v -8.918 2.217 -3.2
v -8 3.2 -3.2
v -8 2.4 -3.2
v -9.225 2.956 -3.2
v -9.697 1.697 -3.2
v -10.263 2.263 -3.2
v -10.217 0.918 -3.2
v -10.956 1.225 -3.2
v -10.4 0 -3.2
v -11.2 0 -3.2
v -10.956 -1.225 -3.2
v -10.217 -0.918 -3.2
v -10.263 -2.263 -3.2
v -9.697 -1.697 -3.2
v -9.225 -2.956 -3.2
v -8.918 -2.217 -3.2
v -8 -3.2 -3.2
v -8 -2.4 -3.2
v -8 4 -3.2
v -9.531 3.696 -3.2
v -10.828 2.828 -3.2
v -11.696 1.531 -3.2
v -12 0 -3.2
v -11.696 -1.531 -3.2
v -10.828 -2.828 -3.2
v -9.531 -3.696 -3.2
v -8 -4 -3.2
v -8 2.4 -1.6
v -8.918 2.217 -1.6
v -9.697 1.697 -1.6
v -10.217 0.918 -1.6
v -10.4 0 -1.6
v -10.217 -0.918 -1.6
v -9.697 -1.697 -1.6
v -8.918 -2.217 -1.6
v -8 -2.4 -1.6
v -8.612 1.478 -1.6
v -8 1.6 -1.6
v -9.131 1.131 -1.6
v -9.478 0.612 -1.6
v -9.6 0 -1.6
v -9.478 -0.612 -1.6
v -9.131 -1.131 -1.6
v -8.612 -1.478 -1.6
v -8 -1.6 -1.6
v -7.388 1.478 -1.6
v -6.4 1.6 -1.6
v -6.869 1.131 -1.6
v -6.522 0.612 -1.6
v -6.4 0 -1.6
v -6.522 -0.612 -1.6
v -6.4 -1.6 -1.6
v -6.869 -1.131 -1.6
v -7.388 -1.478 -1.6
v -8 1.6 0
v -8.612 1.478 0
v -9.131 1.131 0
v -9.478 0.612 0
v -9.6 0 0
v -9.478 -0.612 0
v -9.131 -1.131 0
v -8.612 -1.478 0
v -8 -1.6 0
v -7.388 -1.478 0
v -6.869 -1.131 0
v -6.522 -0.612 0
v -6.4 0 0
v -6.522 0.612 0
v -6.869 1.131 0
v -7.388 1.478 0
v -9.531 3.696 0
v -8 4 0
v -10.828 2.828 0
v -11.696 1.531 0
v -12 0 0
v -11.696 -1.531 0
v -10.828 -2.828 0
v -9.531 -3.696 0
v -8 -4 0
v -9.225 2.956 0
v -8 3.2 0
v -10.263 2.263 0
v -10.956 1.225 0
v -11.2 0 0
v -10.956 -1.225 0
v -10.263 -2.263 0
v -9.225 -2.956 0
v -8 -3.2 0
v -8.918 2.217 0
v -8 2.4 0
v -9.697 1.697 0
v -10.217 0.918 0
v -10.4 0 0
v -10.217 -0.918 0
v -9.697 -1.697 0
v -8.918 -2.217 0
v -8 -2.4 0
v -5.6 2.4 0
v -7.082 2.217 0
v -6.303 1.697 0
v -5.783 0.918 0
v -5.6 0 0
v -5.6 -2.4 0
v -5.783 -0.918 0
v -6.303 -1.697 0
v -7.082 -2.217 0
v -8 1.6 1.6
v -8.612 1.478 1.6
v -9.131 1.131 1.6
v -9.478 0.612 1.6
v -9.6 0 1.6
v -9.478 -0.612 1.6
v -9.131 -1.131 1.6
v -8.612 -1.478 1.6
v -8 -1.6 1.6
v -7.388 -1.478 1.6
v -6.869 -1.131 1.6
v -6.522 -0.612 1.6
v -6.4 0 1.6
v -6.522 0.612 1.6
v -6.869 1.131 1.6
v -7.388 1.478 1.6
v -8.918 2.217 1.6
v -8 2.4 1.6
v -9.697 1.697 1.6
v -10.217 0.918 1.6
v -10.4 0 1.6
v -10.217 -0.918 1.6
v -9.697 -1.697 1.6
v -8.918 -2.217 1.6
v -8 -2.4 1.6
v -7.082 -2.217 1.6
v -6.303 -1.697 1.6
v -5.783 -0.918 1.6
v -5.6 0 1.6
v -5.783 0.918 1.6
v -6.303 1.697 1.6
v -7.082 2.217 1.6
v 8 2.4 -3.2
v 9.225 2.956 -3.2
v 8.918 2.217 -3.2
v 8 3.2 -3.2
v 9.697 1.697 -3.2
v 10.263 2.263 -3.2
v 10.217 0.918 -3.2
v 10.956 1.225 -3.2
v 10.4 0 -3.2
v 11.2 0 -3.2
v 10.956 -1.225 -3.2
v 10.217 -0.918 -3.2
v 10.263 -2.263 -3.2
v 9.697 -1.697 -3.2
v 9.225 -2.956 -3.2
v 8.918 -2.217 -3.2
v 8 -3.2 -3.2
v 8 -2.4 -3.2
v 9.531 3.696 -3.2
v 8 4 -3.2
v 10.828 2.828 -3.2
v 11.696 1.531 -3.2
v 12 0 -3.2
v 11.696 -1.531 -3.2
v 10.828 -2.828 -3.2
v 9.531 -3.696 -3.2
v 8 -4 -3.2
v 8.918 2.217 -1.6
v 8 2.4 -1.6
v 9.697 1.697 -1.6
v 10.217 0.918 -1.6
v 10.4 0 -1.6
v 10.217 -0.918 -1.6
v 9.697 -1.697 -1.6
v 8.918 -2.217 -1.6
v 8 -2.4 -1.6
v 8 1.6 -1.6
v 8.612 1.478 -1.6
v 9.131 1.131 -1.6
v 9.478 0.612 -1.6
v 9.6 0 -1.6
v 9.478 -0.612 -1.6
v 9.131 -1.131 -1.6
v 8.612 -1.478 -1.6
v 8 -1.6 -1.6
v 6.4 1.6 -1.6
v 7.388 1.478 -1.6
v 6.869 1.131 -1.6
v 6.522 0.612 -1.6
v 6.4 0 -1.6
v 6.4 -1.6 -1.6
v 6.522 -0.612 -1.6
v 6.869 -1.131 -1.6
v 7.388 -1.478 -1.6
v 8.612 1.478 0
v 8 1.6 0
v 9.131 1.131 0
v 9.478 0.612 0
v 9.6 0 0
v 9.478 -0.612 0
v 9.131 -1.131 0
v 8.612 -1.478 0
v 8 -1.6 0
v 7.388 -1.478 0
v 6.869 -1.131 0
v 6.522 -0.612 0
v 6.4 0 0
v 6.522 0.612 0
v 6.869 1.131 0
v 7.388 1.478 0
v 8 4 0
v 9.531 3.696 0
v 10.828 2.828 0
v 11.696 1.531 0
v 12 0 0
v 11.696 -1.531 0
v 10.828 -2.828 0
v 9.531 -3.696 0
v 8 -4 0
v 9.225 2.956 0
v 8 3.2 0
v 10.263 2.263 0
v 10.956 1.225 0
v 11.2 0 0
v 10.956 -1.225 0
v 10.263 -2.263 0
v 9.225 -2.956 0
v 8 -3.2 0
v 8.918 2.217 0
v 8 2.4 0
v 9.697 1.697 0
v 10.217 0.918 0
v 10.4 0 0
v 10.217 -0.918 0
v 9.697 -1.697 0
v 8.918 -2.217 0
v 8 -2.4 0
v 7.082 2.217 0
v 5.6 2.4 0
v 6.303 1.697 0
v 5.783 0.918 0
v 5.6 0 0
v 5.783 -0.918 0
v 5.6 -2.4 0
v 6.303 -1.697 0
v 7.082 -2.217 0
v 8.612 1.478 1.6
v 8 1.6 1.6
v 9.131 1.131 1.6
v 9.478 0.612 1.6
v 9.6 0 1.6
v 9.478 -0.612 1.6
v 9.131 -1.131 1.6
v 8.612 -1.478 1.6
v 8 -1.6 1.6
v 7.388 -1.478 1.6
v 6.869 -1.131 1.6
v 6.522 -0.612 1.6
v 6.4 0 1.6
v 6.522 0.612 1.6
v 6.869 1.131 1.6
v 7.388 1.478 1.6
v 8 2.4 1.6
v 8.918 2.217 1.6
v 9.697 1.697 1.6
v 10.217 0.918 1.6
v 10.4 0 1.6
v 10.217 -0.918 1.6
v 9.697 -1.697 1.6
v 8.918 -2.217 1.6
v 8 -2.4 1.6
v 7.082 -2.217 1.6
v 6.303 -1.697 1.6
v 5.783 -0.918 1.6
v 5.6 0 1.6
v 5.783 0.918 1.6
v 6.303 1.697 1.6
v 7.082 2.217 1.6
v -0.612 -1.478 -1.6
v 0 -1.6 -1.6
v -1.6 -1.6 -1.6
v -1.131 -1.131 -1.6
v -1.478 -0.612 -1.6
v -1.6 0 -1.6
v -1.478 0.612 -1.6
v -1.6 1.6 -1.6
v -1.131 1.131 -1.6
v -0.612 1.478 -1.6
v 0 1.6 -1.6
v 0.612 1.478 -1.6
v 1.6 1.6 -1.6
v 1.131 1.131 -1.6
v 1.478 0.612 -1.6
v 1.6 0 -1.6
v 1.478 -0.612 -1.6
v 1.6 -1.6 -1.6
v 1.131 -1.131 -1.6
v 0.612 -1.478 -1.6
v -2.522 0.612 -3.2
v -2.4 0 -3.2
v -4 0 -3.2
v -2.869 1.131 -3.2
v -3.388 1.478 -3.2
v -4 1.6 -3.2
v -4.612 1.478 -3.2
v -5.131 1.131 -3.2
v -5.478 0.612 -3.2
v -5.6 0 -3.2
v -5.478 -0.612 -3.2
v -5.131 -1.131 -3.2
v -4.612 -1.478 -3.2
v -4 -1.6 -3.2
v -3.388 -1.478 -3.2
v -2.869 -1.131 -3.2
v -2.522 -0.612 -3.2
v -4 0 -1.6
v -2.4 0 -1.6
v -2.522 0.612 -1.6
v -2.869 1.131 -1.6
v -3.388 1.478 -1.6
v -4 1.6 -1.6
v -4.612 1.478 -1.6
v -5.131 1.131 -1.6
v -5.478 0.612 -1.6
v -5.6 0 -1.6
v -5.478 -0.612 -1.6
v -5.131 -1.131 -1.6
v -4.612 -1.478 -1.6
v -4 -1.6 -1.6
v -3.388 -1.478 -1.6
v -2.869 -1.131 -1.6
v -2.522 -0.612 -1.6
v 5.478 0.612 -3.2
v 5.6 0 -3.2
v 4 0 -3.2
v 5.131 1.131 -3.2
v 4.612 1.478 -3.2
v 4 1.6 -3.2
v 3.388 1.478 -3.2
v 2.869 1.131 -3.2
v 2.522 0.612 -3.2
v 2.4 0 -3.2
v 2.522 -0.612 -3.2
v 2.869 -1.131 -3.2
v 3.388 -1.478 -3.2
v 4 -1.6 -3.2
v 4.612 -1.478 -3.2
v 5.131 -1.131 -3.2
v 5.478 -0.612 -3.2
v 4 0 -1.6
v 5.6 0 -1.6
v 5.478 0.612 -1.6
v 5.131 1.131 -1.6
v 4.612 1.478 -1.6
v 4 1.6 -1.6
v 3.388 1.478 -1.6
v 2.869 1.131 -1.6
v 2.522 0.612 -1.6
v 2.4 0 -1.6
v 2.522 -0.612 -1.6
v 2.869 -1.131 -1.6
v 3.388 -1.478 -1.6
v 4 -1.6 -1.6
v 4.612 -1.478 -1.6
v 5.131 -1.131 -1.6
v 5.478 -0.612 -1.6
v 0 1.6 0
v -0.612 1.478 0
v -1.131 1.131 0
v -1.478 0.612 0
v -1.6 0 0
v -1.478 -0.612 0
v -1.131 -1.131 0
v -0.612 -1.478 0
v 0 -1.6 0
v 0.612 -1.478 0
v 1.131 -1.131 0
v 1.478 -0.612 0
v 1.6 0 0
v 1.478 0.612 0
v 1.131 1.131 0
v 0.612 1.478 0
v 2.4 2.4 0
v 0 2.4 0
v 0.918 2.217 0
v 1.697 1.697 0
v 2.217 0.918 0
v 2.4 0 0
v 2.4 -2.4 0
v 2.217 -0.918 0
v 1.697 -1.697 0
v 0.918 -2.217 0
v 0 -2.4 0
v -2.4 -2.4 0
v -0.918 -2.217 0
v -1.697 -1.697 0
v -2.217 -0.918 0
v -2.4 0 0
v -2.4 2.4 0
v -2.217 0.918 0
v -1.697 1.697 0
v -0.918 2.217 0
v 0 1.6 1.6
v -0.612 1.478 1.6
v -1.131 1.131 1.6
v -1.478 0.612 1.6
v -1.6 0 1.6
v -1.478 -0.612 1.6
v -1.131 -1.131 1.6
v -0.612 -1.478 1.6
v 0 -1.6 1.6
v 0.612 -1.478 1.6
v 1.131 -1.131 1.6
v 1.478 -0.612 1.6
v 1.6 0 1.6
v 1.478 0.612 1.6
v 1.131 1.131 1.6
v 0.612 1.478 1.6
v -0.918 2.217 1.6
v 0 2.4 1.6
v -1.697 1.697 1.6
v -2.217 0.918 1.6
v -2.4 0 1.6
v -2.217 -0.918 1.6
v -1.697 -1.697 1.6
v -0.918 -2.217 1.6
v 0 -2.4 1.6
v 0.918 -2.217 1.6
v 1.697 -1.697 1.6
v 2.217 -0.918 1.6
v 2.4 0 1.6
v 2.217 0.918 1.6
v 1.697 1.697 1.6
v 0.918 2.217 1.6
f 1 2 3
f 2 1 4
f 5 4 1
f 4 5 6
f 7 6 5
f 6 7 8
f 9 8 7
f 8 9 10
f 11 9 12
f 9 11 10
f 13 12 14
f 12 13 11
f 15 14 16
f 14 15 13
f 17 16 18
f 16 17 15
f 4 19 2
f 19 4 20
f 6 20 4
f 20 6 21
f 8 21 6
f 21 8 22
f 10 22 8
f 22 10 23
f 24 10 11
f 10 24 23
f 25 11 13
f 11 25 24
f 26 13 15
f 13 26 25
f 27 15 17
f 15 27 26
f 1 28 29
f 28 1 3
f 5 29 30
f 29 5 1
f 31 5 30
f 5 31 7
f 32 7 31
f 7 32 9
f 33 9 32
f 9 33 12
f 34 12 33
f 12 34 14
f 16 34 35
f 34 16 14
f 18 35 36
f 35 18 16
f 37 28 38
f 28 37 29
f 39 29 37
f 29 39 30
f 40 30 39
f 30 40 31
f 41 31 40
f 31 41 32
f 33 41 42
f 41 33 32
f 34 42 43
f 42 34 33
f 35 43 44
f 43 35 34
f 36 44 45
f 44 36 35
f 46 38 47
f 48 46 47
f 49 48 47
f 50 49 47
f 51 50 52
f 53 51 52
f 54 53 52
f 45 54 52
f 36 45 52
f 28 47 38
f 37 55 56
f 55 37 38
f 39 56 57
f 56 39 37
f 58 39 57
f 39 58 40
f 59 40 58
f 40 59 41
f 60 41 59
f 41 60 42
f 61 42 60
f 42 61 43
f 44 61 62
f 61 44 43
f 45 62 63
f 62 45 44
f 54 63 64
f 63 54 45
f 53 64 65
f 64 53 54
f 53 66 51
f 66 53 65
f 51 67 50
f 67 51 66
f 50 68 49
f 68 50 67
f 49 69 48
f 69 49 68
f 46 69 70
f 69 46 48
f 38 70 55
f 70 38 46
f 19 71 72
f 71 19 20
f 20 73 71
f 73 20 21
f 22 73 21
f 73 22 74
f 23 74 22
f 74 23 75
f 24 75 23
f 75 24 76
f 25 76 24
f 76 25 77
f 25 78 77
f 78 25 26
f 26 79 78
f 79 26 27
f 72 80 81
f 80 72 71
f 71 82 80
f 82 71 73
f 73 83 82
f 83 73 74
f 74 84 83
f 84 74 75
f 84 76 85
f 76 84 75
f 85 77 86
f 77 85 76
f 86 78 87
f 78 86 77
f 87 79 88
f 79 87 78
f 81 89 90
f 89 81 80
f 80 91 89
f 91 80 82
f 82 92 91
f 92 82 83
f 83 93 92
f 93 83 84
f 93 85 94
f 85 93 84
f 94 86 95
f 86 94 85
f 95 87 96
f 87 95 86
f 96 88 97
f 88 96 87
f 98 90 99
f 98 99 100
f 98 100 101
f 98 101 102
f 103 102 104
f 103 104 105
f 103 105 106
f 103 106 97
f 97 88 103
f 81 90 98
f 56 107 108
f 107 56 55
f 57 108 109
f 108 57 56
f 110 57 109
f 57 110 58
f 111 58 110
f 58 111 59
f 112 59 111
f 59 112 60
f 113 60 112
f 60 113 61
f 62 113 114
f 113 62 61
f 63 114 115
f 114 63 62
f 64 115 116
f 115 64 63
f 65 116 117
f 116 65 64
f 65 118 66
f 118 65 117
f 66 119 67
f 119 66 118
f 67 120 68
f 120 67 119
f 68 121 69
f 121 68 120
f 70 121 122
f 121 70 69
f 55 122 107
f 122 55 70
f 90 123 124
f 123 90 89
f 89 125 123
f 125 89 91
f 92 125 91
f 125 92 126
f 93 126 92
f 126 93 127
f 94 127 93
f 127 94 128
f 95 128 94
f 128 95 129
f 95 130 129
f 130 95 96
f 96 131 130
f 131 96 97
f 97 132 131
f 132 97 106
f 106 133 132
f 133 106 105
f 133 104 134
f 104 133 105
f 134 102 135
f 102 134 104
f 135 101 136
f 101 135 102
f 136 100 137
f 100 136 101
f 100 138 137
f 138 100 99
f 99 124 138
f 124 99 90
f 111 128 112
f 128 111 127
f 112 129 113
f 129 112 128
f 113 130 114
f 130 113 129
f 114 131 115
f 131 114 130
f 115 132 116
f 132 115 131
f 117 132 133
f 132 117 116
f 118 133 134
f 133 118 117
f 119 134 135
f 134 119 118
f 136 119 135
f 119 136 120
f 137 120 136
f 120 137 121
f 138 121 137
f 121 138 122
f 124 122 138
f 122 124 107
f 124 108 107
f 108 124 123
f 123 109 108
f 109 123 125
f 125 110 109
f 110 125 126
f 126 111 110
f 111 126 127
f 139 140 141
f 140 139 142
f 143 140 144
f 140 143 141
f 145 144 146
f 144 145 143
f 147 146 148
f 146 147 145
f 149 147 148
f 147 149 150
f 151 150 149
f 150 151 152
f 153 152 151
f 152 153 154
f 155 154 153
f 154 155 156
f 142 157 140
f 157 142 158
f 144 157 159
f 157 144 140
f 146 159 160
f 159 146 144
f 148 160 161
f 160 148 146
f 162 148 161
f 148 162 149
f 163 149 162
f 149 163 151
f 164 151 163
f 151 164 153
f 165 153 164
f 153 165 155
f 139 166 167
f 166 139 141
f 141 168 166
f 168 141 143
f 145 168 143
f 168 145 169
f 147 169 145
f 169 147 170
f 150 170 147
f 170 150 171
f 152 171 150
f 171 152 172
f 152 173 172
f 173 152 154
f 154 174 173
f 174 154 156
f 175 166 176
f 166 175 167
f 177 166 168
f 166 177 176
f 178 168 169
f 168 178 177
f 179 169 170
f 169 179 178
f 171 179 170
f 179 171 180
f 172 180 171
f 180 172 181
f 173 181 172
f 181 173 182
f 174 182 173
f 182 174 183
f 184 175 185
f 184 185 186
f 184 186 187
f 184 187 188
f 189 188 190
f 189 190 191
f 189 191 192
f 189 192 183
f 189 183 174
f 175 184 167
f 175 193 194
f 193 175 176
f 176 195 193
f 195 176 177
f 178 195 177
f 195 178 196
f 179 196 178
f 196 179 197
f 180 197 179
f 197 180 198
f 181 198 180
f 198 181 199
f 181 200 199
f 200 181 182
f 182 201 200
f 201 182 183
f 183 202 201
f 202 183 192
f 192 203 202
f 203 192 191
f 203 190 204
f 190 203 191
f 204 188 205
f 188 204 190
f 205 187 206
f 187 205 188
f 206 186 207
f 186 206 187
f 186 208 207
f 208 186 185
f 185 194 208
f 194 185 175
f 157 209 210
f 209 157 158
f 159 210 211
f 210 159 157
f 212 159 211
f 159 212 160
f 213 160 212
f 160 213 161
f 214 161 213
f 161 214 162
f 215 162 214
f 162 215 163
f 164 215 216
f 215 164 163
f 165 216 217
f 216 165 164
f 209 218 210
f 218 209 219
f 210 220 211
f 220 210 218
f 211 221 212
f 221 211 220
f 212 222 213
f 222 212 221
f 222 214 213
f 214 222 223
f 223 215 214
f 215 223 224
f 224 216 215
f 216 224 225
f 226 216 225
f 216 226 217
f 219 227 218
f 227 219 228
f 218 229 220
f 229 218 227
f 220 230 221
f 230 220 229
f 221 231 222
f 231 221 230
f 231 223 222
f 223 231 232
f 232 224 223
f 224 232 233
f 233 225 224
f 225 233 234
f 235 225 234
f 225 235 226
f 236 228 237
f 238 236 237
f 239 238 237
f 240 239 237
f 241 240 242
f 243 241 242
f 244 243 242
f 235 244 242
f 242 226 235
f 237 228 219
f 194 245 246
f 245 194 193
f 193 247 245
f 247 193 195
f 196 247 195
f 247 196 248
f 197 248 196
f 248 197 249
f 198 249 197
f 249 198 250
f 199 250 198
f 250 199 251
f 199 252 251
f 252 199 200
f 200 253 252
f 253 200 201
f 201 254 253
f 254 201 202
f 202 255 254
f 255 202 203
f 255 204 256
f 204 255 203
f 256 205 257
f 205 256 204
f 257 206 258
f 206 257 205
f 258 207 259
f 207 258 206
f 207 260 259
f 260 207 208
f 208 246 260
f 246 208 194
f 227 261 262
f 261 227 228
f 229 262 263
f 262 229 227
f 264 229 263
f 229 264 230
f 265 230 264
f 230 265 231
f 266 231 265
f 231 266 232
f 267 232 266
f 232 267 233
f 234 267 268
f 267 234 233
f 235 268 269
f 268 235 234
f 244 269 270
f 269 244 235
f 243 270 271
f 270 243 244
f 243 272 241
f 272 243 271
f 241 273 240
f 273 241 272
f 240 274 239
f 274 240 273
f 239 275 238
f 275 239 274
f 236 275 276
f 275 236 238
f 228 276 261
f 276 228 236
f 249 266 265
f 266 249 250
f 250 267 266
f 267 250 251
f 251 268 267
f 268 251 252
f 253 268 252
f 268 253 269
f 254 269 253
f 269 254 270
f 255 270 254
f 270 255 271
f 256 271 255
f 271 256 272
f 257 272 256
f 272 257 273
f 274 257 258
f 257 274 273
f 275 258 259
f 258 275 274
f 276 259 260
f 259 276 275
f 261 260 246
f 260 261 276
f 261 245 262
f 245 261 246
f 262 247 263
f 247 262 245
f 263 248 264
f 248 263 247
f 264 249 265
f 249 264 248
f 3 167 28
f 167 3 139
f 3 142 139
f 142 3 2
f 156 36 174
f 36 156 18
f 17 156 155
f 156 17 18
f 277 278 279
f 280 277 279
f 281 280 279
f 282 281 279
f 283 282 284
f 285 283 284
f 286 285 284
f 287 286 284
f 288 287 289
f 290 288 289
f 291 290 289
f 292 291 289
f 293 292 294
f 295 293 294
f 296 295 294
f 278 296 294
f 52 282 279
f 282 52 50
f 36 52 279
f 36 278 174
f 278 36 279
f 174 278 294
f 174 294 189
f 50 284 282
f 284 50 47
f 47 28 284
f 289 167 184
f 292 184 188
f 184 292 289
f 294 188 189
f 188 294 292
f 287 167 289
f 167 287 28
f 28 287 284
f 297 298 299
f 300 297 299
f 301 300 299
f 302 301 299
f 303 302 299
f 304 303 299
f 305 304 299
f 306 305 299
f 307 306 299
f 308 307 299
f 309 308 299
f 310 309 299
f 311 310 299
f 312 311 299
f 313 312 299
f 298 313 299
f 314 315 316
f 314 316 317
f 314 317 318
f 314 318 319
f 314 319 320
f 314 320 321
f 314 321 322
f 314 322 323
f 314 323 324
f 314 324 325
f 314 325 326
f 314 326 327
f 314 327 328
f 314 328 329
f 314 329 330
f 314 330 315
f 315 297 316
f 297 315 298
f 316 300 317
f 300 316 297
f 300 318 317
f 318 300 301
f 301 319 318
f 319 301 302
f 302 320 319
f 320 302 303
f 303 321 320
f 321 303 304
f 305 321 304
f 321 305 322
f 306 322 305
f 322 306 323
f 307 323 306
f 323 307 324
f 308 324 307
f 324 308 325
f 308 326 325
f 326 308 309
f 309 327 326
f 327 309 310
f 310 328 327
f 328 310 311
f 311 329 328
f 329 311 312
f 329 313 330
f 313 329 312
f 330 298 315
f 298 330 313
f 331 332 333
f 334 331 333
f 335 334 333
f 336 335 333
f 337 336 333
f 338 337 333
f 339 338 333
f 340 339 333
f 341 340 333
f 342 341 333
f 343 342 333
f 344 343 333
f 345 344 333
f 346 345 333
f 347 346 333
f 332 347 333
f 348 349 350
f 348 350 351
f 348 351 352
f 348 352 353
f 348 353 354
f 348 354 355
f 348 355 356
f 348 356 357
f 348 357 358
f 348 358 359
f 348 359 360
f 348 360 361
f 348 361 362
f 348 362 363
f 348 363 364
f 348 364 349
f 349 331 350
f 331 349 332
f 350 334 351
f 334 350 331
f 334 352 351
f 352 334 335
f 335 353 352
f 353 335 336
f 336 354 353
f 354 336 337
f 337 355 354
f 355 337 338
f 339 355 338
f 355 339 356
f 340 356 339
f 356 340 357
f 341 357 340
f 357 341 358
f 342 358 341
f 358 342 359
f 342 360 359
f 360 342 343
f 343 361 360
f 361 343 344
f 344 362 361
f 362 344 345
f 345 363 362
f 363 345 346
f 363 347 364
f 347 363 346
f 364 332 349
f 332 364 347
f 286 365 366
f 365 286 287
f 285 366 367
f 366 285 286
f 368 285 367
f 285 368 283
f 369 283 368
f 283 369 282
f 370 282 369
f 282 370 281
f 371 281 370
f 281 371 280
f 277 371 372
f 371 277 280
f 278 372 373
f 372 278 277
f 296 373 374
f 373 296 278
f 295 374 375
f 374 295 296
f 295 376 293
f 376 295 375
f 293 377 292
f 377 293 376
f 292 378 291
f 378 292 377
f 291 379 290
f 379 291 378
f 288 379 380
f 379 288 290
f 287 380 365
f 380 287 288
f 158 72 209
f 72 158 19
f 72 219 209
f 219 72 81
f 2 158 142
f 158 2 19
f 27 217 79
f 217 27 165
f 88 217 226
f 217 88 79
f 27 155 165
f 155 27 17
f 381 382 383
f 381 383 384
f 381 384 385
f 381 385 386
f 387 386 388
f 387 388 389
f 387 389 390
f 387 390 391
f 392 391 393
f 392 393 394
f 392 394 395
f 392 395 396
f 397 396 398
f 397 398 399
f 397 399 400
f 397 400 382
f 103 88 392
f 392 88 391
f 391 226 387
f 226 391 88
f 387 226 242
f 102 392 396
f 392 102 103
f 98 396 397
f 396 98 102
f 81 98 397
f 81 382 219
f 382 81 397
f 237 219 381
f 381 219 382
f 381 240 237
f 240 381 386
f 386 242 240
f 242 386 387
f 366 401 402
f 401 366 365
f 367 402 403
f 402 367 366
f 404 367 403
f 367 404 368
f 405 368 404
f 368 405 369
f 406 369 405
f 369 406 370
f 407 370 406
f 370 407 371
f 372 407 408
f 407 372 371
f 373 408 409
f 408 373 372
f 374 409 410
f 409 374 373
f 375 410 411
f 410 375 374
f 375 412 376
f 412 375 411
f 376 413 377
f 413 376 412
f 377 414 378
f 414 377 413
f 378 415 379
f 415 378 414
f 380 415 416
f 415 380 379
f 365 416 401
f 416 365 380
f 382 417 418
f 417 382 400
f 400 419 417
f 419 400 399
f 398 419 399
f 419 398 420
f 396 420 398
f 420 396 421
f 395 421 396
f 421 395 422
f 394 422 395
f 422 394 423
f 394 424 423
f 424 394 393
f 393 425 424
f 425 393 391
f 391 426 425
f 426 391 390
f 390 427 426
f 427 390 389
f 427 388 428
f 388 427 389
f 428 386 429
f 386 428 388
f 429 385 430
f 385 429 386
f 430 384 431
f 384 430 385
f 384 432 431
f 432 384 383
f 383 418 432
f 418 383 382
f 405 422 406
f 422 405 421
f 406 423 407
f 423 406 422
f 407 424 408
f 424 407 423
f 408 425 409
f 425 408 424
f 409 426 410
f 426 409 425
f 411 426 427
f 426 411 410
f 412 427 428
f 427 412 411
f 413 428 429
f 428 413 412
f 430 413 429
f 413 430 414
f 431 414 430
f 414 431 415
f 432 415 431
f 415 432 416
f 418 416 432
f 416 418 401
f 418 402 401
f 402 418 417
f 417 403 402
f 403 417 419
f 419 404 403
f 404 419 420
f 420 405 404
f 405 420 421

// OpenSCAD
use <../lib.scad>
use <../p/4-4cyli.scad>
use <../p/4-4edge.scad>
use <../p/4-4ndis.scad>
use <../p/box2-11.scad>
use <../p/box3u10p.scad>
use <s/77850s01.scad>
use <../p/stud2a.scad>
use <../p/stug3-1x2.scad>
function ldraw_lib__77850() = [
// 0 Plate  1 x  3 Round Ends and  3 Open Studs
// 0 Name: 77850.dat
// 0 Author: Gerald Lasser [GeraldLasser]
// 0 !LDRAW_ORG Part UPDATE 2023-05
// 0 !LICENSE Licensed under CC BY 4.0 : see CAreadme.txt
// 
// 0 BFC CERTIFY CCW
  [0,"BFC","CERTIFY"],
  [0,"BFC","CCW"],
// 
// 0 !HISTORY 2023-10-31 [OrionP] Official Update 2023-05
// 
// 
// 1 16 -20 0 0 1 0 0 0 1 0 0 0 1 s\77850s01.dat
  [1,16,-20,0,0,1,0,0,0,1,0,0,0,1, ldraw_lib__s__77850s01()],
// 1 16 20 0 0 -1 0 0 0 1 0 0 0 1 s\77850s01.dat
  [1,16,20,0,0,-1,0,0,0,1,0,0,0,1, ldraw_lib__s__77850s01()],
// 
// 0 // Bottom
// 1 16 0 6 7 20 0 0 0 0 2 0 -1 0 box2-11.dat
  [1,16,0,6,7,20,0,0,0,0,2,0,-1,0, ldraw_lib__box2_11()],
// 1 16 0 6 -7 -20 0 0 0 0 2 0 1 0 box2-11.dat
  [1,16,0,6,-7,-20,0,0,0,0,2,0,1,0, ldraw_lib__box2_11()],
// 2 24 20 4 -6 -20 4 -6
  [2,24,20,4,-6,-20,4,-6],
// 2 24 -20 4 6 20 4 6
  [2,24,-20,4,6,20,4,6],
// 
// 1 16 0 4 0 0 0 -4 0 -1 0 -4 0 0 4-4ndis.dat
  [1,16,0,4,0,0,0,-4,0,-1,0,-4,0,0, ldraw_lib__4_4ndis()],
// 1 16 0 4 0 0 0 -4 0 1 0 4 0 0 4-4edge.dat
  [1,16,0,4,0,0,0,-4,0,1,0,4,0,0, ldraw_lib__4_4edge()],
// 
// 4 16 -16 4 0 -4 4 0 -4 4 -4 -16 4 -4
  [4,16,-16,4,0,-4,4,0,-4,4,-4,-16,4,-4],
// 3 16 -20 4 -6 -16 4 -4 -4 4 -4
  [3,16,-20,4,-6,-16,4,-4,-4,4,-4],
// 4 16 -4 4 -4 0 4 -4 20 4 -6 -20 4 -6
  [4,16,-4,4,-4,0,4,-4,20,4,-6,-20,4,-6],
// 3 16 20 4 -6 0 4 -4 4 4 -4
  [3,16,20,4,-6,0,4,-4,4,4,-4],
// 3 16 20 4 -6 4 4 -4 16 4 -4
  [3,16,20,4,-6,4,4,-4,16,4,-4],
// 4 16 -16 4 0 -16 4 4 -4 4 4 -4 4 0
  [4,16,-16,4,0,-16,4,4,-4,4,4,-4,4,0],
// 3 16 -16 4 4 -20 4 6 -4 4 4
  [3,16,-16,4,4,-20,4,6,-4,4,4],
// 3 16 4 4 4 20 4 6 16 4 4
  [3,16,4,4,4,20,4,6,16,4,4],
// 4 16 4 4 4 16 4 4 16 4 0 4 4 0
  [4,16,4,4,4,16,4,4,16,4,0,4,4,0],
// 4 16 4 4 -4 4 4 0 16 4 0 16 4 -4
  [4,16,4,4,-4,4,4,0,16,4,0,16,4,-4],
// 4 16 -20 4 6 20 4 6 4 4 4 0 4 4
  [4,16,-20,4,6,20,4,6,4,4,4,0,4,4],
// 3 16 -20 4 6 0 4 4 -4 4 4
  [3,16,-20,4,6,0,4,4,-4,4,4],
// 1 16 0 4 0 1 0 0 0 -1 0 0 0 1 stug3-1x2.dat
  [1,16,0,4,0,1,0,0,0,-1,0,0,0,1, ldraw_lib__stug3_1x2()],
// 
// 0 BFC INVERTNEXT
  [0,"BFC","INVERTNEXT"],
// 1 16 0 4 0 0 0 -4 0 -4 0 4 0 0 4-4cyli.dat
  [1,16,0,4,0,0,0,-4,0,-4,0,4,0,0, ldraw_lib__4_4cyli()],
// 
// 1 16 0 4 8 20 0 0 0 0 -4 0 2 0 box3u10p.dat
  [1,16,0,4,8,20,0,0,0,0,-4,0,2,0, ldraw_lib__box3u10p()],
// 1 16 0 4 -8 -20 0 0 0 0 -4 0 -2 0 box3u10p.dat
  [1,16,0,4,-8,-20,0,0,0,0,-4,0,-2,0, ldraw_lib__box3u10p()],
// 
// 0 // Top
// 1 16 0 0 0 0 0 -6 0 1 0 6 0 0 4-4edge.dat
  [1,16,0,0,0,0,0,-6,0,1,0,6,0,0, ldraw_lib__4_4edge()],
// 1 16 0 0 0 0 0 6 0 1 0 6 0 0 4-4ndis.dat
  [1,16,0,0,0,0,0,6,0,1,0,6,0,0, ldraw_lib__4_4ndis()],
// 3 16 -14 0 -6 -20 0 -8 -6 0 -6
  [3,16,-14,0,-6,-20,0,-8,-6,0,-6],
// 3 16 -6 0 -6 -20 0 -8 0 0 -6
  [3,16,-6,0,-6,-20,0,-8,0,0,-6],
// 4 16 -20 0 -8 20 0 -8 6 0 -6 0 0 -6
  [4,16,-20,0,-8,20,0,-8,6,0,-6,0,0,-6],
// 3 16 6 0 -6 20 0 -8 14 0 -6
  [3,16,6,0,-6,20,0,-8,14,0,-6],
// 4 16 -14 0 -6 -6 0 -6 -6 0 0 -14 0 0
  [4,16,-14,0,-6,-6,0,-6,-6,0,0,-14,0,0],
// 4 16 -6 0 0 -6 0 6 -14 0 6 -14 0 0
  [4,16,-6,0,0,-6,0,6,-14,0,6,-14,0,0],
// 3 16 -20 0 8 -14 0 6 -6 0 6
  [3,16,-20,0,8,-14,0,6,-6,0,6],
// 4 16 -6 0 6 0 0 6 20 0 8 -20 0 8
  [4,16,-6,0,6,0,0,6,20,0,8,-20,0,8],
// 3 16 14 0 6 20 0 8 6 0 6
  [3,16,14,0,6,20,0,8,6,0,6],
// 3 16 6 0 6 20 0 8 0 0 6
  [3,16,6,0,6,20,0,8,0,0,6],
// 4 16 6 0 6 6 0 0 14 0 0 14 0 6
  [4,16,6,0,6,6,0,0,14,0,0,14,0,6],
// 4 16 6 0 0 6 0 -6 14 0 -6 14 0 0
  [4,16,6,0,0,6,0,-6,14,0,-6,14,0,0],
// 1 16 0 0 0 0 0 -1 0 1 0 1 0 0 stud2a.dat
  [1,16,0,0,0,0,0,-1,0,1,0,1,0,0, ldraw_lib__stud2a()],
];
module ldraw_lib__77850(step=0, col=false, unit=2/5, alt=false, line=0.2, solid=!$preview)
    makepoly(ldraw_lib__77850(), step=step, col=col, unit=unit, alt=alt, line=line, solid=solid);
ldraw_lib__77850(line=0.2);
